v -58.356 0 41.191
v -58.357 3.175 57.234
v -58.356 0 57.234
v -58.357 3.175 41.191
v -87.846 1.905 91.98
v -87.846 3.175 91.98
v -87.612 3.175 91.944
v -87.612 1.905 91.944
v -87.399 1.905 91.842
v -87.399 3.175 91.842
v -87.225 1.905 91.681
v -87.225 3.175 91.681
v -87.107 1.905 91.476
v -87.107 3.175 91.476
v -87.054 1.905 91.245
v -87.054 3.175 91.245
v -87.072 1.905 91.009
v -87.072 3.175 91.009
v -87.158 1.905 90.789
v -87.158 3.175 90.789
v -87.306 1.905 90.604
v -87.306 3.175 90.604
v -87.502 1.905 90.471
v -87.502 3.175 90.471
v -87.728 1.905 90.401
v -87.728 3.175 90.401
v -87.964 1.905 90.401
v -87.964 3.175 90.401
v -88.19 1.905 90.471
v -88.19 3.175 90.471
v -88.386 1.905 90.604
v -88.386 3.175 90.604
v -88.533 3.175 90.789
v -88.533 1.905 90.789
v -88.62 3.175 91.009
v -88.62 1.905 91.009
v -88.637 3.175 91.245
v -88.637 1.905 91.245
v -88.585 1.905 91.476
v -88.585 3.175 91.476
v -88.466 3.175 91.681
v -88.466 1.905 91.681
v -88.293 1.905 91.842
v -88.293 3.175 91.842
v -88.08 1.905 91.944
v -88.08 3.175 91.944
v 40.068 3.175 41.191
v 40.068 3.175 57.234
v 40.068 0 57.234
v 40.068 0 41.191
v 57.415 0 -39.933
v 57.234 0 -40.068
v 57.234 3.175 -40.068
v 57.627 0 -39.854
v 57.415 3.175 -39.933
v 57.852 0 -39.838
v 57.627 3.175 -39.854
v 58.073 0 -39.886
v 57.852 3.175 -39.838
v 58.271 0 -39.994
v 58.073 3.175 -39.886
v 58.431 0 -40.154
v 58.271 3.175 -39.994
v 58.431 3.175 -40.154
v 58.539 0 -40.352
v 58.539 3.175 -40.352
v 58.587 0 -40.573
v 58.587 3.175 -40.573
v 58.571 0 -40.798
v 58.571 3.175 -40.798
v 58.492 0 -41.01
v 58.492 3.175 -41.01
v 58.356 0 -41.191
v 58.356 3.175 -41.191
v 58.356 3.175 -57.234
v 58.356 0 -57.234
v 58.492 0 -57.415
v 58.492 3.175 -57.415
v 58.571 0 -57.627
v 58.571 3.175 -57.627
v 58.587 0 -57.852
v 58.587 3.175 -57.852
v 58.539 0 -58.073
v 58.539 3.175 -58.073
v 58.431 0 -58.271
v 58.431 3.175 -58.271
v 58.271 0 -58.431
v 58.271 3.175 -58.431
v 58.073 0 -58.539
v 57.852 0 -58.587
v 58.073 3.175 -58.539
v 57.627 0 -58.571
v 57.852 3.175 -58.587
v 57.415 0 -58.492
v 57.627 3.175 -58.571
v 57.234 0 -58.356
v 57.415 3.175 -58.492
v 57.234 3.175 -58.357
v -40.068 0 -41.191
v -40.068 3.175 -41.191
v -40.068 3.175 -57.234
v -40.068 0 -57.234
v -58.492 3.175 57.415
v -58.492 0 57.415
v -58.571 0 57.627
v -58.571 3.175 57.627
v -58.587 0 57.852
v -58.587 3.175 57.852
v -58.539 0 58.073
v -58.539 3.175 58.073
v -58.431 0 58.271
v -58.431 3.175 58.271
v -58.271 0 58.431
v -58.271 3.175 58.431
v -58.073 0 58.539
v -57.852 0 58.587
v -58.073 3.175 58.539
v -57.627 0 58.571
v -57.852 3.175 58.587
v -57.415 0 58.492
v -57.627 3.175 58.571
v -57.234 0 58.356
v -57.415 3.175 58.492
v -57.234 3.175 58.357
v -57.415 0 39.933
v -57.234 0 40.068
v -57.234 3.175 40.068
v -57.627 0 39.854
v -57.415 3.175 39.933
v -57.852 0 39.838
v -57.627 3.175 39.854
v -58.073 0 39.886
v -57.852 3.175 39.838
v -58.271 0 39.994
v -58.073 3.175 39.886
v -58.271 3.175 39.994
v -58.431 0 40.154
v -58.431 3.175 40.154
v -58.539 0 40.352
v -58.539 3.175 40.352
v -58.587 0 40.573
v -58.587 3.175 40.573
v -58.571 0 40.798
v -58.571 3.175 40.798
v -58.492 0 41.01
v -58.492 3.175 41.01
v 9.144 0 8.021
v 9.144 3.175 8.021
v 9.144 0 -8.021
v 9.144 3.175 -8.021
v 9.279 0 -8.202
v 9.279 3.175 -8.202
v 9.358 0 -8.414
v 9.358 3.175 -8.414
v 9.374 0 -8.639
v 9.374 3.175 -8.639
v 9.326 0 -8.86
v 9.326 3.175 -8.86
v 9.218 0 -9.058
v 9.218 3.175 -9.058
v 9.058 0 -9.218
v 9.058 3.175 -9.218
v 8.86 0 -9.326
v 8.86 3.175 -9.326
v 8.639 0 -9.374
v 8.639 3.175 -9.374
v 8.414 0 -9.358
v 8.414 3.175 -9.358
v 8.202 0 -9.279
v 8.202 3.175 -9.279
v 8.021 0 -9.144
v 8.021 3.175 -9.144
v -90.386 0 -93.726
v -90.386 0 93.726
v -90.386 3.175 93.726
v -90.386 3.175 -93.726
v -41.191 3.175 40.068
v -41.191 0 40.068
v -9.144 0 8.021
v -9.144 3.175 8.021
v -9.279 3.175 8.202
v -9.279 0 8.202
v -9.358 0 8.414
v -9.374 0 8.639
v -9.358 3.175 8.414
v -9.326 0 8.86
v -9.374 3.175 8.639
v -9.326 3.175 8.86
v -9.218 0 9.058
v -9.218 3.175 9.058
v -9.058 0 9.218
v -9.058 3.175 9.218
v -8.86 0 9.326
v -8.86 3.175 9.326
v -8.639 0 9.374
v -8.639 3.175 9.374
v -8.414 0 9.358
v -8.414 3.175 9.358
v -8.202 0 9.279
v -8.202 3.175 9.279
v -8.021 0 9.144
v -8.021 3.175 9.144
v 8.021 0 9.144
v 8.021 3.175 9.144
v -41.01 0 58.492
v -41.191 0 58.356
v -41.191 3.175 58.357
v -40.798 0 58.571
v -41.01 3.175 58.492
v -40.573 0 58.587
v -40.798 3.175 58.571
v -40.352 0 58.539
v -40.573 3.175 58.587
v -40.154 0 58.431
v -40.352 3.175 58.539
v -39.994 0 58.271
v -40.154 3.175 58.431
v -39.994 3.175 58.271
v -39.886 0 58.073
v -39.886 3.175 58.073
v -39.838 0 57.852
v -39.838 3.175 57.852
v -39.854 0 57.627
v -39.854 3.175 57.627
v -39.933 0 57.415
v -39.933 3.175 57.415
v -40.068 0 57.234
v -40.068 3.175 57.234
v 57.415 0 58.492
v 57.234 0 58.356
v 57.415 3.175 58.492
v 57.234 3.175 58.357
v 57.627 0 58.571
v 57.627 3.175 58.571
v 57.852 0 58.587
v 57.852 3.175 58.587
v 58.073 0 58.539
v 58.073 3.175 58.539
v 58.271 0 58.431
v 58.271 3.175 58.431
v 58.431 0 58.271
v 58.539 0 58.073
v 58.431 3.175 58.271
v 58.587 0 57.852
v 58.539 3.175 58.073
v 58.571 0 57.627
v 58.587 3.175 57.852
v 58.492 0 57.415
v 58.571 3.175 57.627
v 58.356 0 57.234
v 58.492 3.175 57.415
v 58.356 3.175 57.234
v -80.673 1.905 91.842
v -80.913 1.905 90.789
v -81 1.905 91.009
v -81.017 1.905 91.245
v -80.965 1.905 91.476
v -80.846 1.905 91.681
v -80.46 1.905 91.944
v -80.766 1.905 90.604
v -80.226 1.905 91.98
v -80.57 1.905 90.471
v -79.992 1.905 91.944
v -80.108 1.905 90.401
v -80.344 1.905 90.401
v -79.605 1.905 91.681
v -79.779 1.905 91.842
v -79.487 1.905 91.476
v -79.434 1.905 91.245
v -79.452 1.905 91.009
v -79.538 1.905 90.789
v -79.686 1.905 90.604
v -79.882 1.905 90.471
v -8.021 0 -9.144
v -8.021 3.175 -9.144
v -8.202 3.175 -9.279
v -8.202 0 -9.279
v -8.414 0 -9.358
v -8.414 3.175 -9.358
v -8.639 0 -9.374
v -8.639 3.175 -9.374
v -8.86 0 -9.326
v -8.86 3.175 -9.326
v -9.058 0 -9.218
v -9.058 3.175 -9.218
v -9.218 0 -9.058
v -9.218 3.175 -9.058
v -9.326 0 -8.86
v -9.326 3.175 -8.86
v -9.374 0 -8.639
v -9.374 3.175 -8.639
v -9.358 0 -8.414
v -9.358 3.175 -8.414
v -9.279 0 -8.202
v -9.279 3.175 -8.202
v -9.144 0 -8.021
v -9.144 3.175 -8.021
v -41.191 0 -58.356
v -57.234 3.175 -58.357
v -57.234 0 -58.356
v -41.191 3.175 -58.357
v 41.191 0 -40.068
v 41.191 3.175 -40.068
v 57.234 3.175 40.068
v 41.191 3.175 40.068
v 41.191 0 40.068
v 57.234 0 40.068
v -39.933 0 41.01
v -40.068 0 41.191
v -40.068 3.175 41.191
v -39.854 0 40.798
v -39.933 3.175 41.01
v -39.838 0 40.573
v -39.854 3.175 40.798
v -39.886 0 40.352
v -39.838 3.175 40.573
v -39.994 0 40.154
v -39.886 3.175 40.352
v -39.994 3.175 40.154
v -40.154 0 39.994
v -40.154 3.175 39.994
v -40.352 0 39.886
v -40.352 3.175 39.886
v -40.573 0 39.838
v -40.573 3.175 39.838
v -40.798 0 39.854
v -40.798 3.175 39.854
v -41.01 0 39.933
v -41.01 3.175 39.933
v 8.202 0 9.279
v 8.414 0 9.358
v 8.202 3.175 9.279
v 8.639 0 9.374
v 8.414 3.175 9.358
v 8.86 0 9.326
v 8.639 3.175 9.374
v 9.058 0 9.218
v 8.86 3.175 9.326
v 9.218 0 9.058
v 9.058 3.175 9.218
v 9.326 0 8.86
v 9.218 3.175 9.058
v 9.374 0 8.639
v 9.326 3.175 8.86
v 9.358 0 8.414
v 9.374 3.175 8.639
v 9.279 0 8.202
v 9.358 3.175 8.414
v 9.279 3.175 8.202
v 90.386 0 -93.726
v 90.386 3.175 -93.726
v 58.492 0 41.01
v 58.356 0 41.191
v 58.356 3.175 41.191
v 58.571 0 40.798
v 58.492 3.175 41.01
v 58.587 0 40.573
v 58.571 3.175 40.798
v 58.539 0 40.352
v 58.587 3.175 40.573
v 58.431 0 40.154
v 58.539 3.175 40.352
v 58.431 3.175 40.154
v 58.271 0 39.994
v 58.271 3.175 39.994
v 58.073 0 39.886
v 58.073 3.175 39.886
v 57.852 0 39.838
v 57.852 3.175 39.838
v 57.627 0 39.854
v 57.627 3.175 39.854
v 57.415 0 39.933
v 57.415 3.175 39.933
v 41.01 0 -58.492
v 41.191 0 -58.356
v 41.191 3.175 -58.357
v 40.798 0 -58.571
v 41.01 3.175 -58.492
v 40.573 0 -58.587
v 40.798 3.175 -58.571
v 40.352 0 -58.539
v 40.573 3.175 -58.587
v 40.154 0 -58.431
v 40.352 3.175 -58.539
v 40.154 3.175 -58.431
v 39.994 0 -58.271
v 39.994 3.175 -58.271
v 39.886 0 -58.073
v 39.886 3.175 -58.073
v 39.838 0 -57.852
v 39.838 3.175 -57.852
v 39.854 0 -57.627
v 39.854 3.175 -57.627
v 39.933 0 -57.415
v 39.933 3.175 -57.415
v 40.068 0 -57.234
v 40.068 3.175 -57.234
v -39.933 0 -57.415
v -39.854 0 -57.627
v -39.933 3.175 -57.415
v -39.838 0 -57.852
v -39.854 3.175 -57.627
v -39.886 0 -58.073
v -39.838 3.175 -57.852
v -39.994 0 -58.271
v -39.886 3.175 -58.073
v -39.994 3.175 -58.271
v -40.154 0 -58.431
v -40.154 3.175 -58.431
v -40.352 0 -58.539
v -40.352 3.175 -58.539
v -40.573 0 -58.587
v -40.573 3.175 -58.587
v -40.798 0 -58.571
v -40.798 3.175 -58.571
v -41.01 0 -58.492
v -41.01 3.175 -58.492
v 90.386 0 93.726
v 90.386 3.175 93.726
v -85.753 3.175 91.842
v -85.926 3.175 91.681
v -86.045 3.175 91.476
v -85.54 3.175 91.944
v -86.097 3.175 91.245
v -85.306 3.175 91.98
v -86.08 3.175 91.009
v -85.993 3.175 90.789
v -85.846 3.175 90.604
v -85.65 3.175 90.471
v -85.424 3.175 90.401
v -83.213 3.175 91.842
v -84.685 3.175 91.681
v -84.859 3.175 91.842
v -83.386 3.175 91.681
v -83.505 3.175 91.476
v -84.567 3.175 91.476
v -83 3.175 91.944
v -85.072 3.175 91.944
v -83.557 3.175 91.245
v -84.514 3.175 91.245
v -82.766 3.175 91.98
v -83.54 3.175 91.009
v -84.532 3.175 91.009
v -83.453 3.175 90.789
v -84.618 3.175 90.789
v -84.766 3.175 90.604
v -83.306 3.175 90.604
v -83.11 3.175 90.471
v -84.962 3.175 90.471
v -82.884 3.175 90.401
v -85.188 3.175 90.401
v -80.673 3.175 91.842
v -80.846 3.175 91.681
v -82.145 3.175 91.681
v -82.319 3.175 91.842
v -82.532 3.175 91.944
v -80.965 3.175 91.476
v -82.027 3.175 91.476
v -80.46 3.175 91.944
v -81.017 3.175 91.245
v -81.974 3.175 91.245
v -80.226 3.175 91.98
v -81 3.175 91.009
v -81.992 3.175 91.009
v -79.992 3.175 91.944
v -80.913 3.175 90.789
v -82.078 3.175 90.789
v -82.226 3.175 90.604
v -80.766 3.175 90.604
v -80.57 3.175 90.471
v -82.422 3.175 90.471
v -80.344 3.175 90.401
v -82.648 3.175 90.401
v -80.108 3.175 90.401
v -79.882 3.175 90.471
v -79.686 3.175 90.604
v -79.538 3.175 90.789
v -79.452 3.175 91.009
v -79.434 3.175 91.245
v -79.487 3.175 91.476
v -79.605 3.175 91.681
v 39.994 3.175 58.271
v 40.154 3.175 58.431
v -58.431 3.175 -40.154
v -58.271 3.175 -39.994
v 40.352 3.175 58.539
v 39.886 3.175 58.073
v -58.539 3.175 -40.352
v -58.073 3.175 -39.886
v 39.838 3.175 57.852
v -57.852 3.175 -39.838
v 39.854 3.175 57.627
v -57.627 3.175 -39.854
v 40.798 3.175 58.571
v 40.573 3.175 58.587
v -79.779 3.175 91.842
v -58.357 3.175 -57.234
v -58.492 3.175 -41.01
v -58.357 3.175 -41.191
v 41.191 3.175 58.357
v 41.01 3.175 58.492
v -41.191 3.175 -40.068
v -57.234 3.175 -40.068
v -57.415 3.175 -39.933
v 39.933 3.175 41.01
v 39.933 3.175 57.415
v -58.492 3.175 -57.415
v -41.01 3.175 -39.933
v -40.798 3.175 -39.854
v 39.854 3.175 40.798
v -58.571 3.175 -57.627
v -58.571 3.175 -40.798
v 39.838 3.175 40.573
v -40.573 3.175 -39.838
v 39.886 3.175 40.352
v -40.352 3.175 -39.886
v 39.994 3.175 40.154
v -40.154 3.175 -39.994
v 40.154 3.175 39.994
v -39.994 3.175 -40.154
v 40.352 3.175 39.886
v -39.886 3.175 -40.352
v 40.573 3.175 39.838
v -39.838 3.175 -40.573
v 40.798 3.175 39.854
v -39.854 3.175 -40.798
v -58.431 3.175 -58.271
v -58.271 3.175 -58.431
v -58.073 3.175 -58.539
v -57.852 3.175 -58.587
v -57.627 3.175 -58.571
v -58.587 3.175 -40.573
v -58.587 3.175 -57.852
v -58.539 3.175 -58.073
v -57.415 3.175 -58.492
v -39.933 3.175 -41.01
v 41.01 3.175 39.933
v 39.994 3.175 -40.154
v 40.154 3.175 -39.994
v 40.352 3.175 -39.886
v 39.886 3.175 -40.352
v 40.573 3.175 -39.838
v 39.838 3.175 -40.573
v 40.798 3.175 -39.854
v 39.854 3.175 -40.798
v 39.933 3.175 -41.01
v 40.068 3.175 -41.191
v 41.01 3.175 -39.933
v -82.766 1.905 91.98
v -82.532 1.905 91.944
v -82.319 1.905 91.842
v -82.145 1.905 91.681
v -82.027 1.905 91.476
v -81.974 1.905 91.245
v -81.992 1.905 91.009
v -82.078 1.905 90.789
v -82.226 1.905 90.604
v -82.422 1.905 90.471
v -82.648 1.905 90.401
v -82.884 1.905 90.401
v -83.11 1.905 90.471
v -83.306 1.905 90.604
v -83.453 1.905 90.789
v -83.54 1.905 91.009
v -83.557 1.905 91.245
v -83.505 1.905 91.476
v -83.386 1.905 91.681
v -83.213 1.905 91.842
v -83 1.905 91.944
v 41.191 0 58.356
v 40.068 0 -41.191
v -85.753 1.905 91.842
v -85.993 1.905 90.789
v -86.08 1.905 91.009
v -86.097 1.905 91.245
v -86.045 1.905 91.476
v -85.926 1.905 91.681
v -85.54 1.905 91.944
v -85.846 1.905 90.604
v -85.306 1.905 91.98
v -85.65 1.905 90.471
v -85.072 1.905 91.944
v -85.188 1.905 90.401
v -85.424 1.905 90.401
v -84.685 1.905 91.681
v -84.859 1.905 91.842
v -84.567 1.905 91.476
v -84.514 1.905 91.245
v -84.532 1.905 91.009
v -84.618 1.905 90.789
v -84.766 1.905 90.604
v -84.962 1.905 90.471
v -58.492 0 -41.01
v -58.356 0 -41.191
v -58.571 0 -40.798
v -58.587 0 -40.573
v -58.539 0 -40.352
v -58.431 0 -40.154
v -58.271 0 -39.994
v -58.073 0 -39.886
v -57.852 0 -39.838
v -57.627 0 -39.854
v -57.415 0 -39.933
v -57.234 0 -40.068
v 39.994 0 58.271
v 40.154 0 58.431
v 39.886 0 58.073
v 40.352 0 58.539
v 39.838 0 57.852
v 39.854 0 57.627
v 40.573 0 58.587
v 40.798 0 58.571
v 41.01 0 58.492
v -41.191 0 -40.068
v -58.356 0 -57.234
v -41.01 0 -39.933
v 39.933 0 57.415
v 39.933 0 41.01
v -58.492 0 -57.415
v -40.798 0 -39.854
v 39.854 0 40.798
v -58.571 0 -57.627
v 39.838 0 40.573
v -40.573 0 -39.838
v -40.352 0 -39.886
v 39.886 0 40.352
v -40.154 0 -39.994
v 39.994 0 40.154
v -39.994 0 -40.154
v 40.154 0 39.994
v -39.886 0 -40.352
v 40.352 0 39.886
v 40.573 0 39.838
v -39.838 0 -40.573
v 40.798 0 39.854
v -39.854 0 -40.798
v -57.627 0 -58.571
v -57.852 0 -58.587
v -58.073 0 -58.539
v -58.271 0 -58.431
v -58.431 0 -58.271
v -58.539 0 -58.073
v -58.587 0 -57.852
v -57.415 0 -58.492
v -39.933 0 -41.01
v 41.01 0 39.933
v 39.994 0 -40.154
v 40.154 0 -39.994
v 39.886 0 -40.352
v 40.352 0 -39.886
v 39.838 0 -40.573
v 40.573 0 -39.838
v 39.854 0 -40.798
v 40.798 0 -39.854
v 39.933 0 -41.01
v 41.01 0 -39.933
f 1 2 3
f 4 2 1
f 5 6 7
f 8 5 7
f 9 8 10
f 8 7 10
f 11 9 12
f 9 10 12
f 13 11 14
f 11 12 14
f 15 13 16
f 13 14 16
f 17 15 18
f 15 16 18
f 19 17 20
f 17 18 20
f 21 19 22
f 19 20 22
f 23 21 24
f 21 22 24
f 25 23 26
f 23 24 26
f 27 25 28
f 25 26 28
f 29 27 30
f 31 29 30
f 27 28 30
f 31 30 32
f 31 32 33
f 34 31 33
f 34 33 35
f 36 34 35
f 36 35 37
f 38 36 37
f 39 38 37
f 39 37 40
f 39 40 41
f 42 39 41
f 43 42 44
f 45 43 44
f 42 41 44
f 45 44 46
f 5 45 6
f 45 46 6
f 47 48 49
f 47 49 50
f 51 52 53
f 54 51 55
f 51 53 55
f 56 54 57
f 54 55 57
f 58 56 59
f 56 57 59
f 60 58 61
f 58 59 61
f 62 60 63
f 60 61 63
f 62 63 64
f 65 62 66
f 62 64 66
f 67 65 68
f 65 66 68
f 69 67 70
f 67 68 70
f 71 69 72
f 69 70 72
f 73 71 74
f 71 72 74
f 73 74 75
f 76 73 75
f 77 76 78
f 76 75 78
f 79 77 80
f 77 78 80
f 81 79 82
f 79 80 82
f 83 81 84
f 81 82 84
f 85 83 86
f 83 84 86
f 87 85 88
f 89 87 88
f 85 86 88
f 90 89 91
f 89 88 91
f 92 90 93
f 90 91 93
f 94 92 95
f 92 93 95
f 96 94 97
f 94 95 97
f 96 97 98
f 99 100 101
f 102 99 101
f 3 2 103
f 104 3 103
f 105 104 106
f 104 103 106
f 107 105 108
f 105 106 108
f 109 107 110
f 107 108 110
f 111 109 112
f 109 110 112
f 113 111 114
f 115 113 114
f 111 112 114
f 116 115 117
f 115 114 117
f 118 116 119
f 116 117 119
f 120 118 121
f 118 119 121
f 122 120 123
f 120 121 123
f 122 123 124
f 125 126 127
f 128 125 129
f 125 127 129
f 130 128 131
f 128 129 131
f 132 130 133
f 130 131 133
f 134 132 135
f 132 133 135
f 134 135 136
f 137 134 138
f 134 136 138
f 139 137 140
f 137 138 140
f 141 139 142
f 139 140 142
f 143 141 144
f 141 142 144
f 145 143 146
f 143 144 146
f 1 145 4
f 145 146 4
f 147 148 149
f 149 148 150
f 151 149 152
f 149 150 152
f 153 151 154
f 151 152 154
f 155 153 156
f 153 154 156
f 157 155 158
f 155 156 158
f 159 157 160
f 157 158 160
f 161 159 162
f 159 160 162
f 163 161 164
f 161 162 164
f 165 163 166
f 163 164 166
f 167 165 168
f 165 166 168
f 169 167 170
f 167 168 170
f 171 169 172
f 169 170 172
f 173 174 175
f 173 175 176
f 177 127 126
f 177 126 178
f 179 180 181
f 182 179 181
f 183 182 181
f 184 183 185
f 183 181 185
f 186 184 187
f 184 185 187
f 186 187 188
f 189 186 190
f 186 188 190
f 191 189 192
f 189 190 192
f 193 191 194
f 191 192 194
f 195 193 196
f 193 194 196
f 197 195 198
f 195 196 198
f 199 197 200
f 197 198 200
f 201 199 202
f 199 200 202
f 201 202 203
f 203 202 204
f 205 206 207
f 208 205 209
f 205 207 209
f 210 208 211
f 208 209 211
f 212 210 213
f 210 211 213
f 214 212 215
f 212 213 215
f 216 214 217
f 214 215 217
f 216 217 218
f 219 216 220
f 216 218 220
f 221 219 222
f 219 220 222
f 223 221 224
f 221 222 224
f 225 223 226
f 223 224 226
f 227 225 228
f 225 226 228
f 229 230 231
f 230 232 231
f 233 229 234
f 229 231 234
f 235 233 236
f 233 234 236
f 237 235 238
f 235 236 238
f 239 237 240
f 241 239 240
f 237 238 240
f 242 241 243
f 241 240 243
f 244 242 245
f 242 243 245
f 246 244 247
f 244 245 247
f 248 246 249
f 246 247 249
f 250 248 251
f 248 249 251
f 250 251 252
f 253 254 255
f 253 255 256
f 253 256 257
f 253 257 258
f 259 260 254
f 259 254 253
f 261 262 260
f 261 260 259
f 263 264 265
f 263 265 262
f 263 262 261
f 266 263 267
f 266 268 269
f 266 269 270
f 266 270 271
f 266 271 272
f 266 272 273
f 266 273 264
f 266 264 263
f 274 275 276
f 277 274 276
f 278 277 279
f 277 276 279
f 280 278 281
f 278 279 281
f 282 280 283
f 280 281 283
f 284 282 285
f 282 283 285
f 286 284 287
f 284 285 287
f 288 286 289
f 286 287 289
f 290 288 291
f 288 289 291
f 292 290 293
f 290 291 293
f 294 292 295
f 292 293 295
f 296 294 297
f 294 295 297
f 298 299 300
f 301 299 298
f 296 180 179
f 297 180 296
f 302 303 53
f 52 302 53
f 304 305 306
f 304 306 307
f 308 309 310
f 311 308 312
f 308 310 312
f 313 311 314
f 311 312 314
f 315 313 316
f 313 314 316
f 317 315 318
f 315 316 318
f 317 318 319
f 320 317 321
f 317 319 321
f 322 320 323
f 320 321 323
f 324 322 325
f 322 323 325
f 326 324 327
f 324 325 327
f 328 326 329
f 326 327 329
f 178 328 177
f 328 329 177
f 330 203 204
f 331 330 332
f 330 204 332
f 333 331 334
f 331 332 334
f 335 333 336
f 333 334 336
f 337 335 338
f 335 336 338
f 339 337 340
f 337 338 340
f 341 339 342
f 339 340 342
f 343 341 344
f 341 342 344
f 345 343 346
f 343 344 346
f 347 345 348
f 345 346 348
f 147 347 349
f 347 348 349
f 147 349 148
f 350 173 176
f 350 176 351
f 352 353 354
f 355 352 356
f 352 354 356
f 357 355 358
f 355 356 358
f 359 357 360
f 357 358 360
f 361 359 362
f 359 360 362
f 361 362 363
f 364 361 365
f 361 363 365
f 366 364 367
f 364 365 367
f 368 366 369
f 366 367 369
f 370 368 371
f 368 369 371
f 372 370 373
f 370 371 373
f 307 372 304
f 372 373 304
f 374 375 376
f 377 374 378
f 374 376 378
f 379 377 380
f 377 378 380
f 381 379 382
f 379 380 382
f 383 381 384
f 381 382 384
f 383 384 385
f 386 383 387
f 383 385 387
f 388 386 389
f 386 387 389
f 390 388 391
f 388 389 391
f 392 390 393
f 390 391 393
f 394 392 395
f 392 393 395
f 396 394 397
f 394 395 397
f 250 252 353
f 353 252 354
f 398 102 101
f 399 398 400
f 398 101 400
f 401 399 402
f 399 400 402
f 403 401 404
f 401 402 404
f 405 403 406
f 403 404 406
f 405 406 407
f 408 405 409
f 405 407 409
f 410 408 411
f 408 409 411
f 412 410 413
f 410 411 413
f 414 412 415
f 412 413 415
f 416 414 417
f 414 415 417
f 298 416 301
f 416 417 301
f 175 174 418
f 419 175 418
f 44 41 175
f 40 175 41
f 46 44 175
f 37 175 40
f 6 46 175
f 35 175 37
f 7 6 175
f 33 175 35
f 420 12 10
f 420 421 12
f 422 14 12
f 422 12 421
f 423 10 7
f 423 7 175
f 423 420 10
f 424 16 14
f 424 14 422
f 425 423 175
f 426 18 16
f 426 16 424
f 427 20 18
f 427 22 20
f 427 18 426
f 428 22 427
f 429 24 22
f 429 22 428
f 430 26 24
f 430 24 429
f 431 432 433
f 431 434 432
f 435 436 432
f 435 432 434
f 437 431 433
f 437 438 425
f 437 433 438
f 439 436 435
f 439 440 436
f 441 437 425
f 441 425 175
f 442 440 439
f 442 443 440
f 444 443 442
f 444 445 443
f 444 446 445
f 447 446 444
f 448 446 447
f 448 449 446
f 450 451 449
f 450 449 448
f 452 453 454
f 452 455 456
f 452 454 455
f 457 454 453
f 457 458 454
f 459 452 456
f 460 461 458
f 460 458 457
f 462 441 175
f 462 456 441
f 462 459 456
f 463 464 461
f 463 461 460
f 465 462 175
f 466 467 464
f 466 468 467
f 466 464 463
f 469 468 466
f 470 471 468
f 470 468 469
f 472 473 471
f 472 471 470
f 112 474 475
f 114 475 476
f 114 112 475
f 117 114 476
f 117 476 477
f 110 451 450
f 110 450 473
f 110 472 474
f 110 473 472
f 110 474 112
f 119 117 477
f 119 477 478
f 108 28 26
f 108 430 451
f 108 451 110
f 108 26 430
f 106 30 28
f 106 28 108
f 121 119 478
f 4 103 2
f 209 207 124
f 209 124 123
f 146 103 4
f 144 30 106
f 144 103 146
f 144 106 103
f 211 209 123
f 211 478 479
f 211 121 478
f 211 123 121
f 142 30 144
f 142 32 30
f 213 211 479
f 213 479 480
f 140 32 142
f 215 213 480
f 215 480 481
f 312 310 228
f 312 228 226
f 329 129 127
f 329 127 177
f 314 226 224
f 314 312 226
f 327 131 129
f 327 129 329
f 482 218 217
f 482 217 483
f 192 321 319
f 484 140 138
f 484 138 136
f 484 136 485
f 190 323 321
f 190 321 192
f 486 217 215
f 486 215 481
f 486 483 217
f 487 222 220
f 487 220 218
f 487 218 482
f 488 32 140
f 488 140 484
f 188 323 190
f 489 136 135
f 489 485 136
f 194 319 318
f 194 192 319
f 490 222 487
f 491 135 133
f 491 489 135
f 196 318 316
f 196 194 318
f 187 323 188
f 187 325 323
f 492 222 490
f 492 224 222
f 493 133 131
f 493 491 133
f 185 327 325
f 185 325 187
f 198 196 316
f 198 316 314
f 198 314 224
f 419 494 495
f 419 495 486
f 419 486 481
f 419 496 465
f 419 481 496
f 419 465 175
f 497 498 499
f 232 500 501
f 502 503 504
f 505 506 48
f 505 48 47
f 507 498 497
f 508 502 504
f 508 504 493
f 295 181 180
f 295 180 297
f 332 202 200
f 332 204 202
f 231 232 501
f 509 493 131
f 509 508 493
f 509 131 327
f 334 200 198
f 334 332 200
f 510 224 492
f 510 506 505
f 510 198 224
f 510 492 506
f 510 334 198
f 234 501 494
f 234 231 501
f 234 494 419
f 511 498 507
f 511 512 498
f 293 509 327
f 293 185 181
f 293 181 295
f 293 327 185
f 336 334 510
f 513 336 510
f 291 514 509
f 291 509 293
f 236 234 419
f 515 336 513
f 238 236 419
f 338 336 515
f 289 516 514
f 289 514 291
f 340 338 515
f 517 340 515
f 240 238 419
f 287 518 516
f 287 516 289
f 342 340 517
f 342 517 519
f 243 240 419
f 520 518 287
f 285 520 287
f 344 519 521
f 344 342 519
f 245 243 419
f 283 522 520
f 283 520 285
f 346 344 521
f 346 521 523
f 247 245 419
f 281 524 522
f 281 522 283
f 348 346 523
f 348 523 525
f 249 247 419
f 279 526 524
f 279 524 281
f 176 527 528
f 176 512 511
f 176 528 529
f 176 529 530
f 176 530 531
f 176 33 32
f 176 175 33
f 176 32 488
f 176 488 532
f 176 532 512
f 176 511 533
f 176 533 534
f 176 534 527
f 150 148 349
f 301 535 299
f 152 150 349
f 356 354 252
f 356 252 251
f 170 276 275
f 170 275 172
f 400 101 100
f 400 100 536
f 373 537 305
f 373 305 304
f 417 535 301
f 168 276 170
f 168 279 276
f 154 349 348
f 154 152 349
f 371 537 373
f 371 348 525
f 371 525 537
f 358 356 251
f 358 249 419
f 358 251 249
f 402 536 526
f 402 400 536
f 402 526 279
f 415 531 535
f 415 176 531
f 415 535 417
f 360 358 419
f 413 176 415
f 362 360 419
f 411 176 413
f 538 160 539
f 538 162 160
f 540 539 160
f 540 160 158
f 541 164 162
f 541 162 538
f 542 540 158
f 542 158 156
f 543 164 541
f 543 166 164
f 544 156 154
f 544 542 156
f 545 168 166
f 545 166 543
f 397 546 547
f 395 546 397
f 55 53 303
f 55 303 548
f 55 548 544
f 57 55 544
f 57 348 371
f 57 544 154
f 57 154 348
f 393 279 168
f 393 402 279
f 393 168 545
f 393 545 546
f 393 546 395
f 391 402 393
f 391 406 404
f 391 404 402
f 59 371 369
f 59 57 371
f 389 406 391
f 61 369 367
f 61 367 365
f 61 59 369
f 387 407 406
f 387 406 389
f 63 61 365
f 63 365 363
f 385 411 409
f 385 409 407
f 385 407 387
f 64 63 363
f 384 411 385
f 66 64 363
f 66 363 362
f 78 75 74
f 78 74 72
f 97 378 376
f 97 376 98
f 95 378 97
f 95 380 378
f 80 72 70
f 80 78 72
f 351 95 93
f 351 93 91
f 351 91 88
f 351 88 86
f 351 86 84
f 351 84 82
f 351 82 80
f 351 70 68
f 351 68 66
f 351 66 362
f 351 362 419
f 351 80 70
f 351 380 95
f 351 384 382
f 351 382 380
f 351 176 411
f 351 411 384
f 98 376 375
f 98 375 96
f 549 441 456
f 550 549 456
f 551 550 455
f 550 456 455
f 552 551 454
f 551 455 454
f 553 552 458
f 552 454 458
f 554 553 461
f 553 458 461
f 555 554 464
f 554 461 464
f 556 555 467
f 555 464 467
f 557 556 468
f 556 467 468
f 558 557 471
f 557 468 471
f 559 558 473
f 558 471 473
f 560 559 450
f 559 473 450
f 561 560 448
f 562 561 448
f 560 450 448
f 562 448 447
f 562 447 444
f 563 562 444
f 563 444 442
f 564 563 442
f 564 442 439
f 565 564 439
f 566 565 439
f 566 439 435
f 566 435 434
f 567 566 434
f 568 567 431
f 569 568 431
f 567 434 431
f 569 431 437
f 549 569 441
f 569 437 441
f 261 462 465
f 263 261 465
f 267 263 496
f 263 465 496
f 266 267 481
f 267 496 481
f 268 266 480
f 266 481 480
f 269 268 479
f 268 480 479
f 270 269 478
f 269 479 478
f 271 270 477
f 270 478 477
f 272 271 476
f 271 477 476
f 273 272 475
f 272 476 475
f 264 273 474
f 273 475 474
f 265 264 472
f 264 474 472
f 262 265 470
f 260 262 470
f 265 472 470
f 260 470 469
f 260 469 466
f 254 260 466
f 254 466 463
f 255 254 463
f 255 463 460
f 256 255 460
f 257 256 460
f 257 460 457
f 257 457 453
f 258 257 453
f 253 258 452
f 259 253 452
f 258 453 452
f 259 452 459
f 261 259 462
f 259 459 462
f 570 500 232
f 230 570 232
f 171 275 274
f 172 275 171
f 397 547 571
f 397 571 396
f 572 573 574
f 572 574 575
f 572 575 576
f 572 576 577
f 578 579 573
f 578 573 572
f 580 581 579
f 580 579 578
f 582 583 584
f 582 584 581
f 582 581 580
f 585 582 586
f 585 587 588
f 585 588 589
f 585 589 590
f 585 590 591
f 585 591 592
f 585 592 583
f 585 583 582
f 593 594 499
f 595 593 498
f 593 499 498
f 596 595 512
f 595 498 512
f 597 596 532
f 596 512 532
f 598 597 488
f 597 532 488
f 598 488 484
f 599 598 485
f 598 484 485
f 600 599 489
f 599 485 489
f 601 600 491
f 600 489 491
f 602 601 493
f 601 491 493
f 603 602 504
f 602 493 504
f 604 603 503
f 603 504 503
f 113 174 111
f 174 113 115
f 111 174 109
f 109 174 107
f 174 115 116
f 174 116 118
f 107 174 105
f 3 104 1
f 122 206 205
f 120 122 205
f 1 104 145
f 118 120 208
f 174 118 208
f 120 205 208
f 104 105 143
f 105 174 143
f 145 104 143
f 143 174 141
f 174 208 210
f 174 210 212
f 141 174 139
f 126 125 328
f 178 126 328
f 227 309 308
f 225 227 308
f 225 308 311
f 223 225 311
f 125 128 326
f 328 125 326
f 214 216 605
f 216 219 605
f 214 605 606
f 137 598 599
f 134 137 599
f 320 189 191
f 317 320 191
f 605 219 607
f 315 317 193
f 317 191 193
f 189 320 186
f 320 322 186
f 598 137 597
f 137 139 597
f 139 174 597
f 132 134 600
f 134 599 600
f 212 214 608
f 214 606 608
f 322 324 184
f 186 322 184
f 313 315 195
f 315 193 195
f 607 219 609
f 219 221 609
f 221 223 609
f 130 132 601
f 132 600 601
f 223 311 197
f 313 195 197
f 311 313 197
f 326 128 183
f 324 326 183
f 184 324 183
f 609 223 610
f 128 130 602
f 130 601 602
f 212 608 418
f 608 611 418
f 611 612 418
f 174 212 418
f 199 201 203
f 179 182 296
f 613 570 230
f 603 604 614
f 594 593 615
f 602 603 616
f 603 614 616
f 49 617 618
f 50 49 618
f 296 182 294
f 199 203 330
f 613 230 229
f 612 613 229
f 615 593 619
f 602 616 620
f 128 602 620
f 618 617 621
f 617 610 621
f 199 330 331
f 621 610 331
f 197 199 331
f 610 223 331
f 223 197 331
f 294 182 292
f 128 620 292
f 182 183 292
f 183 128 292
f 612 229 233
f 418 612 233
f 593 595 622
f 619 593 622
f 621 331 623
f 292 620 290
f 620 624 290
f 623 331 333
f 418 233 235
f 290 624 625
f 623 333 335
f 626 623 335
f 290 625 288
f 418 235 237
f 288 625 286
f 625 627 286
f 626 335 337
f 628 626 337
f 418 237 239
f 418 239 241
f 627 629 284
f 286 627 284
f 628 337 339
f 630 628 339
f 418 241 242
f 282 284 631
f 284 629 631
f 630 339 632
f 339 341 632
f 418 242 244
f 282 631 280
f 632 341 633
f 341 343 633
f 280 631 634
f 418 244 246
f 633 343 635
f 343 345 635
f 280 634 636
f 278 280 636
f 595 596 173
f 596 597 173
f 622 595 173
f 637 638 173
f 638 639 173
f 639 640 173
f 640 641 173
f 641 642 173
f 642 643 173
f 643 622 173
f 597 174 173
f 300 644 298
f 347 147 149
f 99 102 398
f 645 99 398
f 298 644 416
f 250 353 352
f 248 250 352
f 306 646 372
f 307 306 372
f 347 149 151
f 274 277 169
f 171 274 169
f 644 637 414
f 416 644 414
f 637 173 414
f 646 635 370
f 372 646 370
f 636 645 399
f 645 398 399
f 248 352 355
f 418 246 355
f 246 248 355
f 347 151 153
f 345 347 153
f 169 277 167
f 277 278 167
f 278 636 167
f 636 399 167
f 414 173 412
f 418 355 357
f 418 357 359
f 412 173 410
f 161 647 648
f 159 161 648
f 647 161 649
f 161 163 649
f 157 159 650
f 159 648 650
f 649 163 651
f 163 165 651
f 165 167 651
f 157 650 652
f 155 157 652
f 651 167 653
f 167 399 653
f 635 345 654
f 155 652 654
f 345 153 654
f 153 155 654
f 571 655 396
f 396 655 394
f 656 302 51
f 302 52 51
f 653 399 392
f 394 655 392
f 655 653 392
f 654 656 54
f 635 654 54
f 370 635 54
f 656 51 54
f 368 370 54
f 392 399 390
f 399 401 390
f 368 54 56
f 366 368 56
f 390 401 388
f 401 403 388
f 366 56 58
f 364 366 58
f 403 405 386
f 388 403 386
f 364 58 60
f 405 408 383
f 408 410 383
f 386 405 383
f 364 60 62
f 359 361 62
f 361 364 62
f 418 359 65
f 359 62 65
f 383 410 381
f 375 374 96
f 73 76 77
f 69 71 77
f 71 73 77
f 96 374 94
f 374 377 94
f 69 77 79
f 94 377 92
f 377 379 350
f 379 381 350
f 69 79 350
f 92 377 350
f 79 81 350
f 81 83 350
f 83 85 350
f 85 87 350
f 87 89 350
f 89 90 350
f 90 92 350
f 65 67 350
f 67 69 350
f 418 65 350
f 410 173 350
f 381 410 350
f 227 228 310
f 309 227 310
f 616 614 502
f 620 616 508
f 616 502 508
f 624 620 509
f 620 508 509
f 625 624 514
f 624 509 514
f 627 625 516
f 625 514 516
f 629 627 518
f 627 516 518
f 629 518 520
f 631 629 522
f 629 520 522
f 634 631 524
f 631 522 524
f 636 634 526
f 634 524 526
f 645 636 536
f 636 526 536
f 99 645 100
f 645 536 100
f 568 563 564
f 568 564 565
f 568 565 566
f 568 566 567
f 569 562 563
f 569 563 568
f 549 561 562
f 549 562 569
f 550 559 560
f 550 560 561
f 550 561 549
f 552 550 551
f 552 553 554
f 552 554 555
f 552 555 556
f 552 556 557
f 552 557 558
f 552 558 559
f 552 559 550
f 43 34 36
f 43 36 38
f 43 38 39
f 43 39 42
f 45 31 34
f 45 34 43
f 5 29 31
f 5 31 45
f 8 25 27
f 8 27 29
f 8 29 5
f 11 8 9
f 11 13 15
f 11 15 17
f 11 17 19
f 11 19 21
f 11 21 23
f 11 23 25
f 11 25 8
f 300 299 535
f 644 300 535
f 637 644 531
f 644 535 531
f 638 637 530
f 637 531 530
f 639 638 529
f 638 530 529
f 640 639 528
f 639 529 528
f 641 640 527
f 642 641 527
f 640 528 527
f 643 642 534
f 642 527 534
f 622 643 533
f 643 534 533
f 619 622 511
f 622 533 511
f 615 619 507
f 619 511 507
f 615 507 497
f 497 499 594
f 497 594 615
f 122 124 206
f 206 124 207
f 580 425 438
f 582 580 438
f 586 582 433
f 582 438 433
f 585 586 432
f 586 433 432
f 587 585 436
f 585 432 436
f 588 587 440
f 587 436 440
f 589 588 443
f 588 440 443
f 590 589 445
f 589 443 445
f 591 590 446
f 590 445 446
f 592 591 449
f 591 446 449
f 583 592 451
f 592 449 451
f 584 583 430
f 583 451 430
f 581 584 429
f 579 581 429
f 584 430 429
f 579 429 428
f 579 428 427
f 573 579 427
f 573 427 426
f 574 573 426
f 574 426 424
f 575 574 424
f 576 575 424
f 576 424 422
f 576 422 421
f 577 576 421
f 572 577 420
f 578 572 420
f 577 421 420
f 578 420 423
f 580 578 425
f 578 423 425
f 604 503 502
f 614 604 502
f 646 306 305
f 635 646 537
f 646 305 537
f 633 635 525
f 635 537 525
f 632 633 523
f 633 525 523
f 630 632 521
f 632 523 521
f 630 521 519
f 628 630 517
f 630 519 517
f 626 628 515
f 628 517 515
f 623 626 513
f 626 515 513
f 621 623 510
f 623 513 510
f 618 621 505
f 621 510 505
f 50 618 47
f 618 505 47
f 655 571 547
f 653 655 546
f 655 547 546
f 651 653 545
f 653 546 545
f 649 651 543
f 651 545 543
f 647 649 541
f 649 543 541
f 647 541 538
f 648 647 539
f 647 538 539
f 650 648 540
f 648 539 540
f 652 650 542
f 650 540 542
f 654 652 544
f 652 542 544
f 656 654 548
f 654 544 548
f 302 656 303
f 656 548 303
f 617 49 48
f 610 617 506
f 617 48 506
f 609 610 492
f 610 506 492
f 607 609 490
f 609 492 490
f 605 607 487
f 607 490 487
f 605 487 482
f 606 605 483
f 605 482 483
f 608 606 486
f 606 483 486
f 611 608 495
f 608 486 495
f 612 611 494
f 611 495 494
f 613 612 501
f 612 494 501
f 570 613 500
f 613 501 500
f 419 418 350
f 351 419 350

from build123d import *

# Parameters (mm, degrees)
SKETCH1_W           = 180.7718
SKETCH1_H           = 187.452
BOSS_EXTRUDE1_DEPTH = 3.175
SKETCH2_W           = 18.288
SKETCH2_H           = 18.288
CUT_EXTRUDE1_DEPTH  = 3.175
SKETCH3_R           = 0.79375
CUT_EXTRUDE2_DEPTH  = 131.246898696
SKETCH9_R           = 0.79375
CUT_EXTRUDE4_DEPTH  = 1.27
LPATTERN1_COUNT     = 4
LPATTERN1_PITCH     = 2.54


with BuildPart() as part:
    # Sketch1 → Boss-Extrude1 (new body)
    with BuildSketch(Plane(origin=(0, 0, 0), x_dir=(1, 0, 0), z_dir=(0, 1, 0))):
        Rectangle(SKETCH1_W, SKETCH1_H)
    extrude(amount=BOSS_EXTRUDE1_DEPTH)

    # Sketch2 → Cut-Extrude1 (cut)
    with BuildSketch(Plane(origin=(0, 3.175, 0), x_dir=(1, 0, 0), z_dir=(0, 1, 0))):
        Rectangle(SKETCH2_W, SKETCH2_H)
    cut_extrude1 = extrude(amount=-CUT_EXTRUDE1_DEPTH, mode=Mode.SUBTRACT)

    # Sketch3 → Cut-Extrude2 (cut, through all)
    with BuildSketch(Plane(origin=(0, 3.175, 0), x_dir=(1, 0, 0), z_dir=(0, 1, 0))):
        with Locations((8.582733992, -8.582733992)):
            Circle(SKETCH3_R)
        with Locations((-8.582733992, -8.582733992)):
            Circle(SKETCH3_R)
        with Locations((-8.582733992, 8.582733992)):
            Circle(SKETCH3_R)
        with Locations((8.582733992, 8.582733992)):
            Circle(SKETCH3_R)
    cut_extrude2 = extrude(amount=-CUT_EXTRUDE2_DEPTH, mode=Mode.SUBTRACT)

    # Sketch-Pattern1: Cut-Extrude1, Cut-Extrude2 at 4 more places
    with Locations((-49.2125, 0, 49.2125), (-49.2125, 0, -49.2125), (49.2125, 0, -49.2125), (49.2125, 0, 49.2125)):
        add(cut_extrude1, mode=Mode.SUBTRACT)
        add(cut_extrude2, mode=Mode.SUBTRACT)

    # Sketch9 → Cut-Extrude4 (cut)
    with BuildSketch(Plane(origin=(0, 3.175, 0), x_dir=(1, 0, 0), z_dir=(0, 1, 0))):
        with Locations(Location((-87.8459, -91.186, 0), (0, 0, 270))):
            Circle(SKETCH9_R)
    cut_extrude4 = extrude(amount=-CUT_EXTRUDE4_DEPTH, mode=Mode.SUBTRACT)

    # LPattern1: Cut-Extrude4 ×4
    with Locations(*[(i * LPATTERN1_PITCH, 0, 0) for i in range(1, LPATTERN1_COUNT)]):
        add(cut_extrude4, mode=Mode.SUBTRACT)


solid = part.part
